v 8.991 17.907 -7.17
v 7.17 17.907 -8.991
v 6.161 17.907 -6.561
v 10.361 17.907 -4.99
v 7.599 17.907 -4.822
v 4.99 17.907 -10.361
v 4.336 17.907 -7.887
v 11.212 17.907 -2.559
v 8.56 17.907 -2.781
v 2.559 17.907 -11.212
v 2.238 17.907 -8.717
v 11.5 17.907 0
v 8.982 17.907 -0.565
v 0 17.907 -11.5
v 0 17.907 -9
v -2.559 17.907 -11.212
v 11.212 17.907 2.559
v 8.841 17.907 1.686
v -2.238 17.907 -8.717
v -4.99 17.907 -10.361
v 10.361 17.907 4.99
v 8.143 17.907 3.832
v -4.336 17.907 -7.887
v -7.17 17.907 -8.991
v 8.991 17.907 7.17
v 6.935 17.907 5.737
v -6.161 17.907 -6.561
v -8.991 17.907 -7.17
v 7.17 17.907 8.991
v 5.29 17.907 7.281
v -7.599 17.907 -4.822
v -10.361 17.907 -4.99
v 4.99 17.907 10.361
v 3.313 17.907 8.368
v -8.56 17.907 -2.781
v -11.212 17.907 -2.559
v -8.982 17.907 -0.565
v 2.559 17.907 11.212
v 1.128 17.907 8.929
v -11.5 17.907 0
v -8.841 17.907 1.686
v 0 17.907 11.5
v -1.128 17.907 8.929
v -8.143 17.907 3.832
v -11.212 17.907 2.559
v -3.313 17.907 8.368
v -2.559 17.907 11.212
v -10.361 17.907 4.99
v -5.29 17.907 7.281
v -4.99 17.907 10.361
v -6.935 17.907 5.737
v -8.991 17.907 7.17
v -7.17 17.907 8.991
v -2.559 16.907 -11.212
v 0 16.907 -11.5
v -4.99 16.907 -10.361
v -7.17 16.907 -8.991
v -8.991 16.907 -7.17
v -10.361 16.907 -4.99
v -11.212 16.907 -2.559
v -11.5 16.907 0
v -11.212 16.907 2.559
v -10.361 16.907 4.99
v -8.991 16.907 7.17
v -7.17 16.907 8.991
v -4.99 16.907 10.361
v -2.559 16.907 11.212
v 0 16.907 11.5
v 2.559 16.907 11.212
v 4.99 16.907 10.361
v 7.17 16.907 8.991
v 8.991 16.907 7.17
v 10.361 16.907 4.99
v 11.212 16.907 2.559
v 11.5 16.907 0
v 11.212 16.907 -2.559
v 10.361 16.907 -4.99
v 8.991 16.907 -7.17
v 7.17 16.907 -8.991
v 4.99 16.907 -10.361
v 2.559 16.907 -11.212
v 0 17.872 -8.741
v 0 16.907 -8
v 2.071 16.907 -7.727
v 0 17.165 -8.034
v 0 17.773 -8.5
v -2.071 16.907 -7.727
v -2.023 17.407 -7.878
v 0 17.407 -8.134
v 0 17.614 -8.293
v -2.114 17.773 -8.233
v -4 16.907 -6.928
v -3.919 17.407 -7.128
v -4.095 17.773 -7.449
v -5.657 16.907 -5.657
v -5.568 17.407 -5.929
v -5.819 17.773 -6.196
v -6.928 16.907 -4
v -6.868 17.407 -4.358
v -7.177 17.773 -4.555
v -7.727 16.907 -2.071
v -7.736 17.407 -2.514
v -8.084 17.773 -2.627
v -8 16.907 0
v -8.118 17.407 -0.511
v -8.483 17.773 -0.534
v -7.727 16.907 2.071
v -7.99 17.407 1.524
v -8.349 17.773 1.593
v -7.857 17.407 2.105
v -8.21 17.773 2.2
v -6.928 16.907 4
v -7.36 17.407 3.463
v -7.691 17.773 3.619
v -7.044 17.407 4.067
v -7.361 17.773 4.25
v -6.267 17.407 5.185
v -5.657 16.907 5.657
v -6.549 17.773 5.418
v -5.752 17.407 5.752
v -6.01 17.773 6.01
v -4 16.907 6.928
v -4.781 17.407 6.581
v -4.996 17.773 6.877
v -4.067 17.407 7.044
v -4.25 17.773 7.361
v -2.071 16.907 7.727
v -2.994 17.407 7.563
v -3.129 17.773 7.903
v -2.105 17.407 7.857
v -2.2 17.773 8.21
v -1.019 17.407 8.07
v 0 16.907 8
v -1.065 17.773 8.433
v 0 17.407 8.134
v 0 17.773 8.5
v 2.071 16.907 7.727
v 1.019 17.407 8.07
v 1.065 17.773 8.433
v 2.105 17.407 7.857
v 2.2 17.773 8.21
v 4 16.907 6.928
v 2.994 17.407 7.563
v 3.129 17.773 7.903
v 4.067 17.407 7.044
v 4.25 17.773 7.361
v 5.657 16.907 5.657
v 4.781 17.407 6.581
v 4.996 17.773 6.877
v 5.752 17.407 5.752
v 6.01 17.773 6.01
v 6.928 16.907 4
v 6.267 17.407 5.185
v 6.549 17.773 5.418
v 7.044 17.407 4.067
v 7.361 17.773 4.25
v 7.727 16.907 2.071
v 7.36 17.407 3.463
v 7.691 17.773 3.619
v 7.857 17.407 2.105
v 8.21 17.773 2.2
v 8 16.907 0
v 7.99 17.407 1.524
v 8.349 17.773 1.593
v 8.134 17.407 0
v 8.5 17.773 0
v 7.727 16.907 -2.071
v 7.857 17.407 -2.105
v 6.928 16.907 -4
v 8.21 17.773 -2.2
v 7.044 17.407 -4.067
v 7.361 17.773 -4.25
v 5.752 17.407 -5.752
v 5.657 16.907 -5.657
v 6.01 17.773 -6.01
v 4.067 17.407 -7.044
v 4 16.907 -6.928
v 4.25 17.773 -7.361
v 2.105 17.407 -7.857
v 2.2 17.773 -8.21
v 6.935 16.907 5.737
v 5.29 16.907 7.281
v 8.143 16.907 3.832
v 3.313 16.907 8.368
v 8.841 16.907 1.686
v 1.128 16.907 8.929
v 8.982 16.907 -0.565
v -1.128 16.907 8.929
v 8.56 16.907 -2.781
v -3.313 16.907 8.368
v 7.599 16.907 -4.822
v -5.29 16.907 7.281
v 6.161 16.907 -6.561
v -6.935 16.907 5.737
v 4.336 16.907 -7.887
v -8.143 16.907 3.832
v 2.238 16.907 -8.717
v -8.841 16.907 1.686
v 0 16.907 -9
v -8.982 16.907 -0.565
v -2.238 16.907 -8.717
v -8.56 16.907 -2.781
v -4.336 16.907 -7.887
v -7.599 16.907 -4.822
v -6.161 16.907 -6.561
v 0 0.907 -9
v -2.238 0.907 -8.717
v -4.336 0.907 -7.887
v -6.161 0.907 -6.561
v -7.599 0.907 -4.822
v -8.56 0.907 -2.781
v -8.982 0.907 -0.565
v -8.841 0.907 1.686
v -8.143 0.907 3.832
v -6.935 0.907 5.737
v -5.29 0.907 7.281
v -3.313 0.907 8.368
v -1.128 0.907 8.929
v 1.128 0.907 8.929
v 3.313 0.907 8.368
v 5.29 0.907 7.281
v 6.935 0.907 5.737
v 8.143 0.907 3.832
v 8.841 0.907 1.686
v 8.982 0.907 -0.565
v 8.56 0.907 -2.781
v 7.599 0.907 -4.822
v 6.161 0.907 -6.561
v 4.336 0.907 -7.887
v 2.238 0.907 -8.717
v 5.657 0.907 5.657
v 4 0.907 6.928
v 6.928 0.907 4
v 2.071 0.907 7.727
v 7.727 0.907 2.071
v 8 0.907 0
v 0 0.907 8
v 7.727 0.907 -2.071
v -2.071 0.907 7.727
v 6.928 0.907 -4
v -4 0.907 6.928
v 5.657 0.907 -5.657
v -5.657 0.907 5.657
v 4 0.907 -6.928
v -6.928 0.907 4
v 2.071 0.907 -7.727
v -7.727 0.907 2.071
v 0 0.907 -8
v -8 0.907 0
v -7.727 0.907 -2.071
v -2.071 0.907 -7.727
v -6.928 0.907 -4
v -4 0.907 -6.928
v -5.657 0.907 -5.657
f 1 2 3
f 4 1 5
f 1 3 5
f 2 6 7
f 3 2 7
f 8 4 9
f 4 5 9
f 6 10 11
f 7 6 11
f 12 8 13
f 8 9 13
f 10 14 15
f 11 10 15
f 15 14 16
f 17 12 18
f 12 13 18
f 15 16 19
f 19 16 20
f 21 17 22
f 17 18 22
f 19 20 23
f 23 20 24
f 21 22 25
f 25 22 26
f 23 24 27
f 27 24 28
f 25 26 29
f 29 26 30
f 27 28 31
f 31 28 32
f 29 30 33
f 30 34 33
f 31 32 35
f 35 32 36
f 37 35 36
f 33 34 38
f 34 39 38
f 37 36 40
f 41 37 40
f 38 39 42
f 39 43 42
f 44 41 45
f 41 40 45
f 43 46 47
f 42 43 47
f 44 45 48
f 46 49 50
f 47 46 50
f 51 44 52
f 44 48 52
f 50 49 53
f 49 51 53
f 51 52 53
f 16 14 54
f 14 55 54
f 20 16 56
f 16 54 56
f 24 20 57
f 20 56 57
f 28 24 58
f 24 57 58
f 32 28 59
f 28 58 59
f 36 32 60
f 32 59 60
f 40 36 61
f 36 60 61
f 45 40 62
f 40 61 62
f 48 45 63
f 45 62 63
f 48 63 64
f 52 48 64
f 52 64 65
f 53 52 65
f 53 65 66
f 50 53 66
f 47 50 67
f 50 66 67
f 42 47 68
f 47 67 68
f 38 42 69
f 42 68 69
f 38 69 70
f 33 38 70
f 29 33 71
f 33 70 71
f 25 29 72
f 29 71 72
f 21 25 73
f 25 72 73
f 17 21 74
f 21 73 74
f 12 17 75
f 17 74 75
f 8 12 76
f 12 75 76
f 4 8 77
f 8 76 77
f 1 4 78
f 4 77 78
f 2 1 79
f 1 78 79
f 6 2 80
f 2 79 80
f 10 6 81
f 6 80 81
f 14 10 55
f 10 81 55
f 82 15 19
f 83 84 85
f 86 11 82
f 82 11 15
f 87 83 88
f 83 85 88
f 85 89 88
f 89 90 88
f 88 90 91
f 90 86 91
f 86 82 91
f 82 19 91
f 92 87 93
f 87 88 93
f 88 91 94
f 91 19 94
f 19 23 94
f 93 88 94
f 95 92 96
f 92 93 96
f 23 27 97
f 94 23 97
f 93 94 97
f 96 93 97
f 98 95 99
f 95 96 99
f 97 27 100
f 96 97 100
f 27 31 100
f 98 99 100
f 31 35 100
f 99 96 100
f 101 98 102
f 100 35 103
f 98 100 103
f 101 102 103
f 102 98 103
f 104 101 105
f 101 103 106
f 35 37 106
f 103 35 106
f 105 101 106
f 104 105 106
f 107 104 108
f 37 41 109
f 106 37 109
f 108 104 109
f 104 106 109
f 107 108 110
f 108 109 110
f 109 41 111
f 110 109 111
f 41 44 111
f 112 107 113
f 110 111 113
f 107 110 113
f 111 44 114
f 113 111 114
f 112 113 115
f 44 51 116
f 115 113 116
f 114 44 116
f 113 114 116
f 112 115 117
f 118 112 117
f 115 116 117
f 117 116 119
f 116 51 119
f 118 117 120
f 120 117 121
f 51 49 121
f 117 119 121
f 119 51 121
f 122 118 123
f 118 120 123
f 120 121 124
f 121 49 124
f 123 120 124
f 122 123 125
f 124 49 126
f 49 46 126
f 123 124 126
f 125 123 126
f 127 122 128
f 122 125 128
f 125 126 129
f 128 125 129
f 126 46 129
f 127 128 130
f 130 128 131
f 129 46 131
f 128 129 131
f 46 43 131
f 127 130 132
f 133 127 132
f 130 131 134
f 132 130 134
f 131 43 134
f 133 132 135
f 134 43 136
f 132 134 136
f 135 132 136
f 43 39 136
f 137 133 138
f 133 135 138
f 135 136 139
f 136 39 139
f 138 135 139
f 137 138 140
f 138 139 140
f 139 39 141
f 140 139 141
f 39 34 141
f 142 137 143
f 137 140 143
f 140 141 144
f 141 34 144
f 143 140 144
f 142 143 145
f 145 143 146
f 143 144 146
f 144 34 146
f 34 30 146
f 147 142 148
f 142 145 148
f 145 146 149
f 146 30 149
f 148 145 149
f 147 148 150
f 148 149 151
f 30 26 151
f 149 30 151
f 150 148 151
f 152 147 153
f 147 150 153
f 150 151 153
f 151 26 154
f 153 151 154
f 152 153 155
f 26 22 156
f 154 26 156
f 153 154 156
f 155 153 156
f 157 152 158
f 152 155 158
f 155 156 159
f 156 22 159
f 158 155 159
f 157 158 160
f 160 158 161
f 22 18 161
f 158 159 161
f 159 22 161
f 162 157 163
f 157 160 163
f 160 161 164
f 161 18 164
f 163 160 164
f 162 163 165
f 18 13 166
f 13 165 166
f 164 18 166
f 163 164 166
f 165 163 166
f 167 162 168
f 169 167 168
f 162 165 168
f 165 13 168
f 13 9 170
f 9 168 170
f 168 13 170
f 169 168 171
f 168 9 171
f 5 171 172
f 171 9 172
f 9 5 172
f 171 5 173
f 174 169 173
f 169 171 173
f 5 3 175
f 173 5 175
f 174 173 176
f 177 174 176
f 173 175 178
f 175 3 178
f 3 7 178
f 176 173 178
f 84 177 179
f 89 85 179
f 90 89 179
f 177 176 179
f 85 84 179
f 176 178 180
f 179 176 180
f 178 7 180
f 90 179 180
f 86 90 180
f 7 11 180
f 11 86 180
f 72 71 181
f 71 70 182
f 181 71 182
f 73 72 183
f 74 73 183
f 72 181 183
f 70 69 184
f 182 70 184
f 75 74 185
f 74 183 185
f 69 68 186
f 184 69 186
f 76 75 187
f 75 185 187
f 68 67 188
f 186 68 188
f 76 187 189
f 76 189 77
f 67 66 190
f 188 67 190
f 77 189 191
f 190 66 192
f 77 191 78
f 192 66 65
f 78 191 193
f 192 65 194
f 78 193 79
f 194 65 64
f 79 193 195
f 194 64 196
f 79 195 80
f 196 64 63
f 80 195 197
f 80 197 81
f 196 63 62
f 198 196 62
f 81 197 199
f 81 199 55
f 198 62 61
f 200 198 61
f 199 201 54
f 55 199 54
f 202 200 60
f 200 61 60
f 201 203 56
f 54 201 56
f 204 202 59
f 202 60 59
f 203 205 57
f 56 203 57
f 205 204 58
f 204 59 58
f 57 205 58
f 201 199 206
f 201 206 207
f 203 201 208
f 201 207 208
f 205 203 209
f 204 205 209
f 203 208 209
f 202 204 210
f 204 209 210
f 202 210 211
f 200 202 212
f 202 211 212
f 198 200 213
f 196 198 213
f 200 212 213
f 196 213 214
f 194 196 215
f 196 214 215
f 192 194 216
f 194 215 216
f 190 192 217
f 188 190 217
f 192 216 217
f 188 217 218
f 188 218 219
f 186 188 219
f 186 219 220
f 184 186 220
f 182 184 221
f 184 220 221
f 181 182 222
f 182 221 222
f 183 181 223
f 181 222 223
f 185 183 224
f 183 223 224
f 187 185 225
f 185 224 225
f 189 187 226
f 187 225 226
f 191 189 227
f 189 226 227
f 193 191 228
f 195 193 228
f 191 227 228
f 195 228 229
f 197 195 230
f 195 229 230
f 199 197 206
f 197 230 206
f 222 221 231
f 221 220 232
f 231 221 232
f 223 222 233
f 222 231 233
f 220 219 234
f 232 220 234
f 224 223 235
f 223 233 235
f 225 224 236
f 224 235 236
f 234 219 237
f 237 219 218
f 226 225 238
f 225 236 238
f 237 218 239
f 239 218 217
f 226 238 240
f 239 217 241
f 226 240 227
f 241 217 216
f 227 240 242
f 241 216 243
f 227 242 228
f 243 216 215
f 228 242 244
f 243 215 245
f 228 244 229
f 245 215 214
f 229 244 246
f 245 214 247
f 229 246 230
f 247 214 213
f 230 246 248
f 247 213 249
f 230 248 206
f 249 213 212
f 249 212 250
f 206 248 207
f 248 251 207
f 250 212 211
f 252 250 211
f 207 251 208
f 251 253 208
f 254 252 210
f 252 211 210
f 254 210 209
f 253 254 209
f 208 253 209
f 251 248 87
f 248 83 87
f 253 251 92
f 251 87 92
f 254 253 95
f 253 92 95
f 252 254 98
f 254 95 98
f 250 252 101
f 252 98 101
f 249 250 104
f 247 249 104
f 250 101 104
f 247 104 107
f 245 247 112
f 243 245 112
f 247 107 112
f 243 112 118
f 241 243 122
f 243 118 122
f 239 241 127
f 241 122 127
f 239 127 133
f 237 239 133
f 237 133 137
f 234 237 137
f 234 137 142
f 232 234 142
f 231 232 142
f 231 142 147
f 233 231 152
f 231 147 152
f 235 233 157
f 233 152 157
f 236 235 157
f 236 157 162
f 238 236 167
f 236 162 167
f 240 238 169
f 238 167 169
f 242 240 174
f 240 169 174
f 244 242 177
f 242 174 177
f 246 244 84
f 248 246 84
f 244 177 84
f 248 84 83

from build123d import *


with BuildPart() as part:
    # 草图1 → 旋转-薄壁1 (revolve)
    with BuildSketch(Plane(origin=(0, 0, 0), x_dir=(0, 0, -1), z_dir=(1, 0, 0))):
        with BuildLine():
            Line((8, 0.906546657), (8, 16.906546657))
            ThreePointArc((8, 16.906546657), (8.292893219, 17.613653438), (9, 17.906546657))
            Line((9, 17.906546657), (11.5, 17.906546657))
            Line((11.5, 17.906546657), (11.5, 16.906546657))
            Line((11.5, 16.906546657), (9, 16.906546657))
            Line((9, 16.906546657), (9, 0.906546657))
            Line((9, 0.906546657), (8, 0.906546657))
        make_face()
    revolve(axis=Axis((0, 0, 0), (0, 1, 0)))


solid = part.part
